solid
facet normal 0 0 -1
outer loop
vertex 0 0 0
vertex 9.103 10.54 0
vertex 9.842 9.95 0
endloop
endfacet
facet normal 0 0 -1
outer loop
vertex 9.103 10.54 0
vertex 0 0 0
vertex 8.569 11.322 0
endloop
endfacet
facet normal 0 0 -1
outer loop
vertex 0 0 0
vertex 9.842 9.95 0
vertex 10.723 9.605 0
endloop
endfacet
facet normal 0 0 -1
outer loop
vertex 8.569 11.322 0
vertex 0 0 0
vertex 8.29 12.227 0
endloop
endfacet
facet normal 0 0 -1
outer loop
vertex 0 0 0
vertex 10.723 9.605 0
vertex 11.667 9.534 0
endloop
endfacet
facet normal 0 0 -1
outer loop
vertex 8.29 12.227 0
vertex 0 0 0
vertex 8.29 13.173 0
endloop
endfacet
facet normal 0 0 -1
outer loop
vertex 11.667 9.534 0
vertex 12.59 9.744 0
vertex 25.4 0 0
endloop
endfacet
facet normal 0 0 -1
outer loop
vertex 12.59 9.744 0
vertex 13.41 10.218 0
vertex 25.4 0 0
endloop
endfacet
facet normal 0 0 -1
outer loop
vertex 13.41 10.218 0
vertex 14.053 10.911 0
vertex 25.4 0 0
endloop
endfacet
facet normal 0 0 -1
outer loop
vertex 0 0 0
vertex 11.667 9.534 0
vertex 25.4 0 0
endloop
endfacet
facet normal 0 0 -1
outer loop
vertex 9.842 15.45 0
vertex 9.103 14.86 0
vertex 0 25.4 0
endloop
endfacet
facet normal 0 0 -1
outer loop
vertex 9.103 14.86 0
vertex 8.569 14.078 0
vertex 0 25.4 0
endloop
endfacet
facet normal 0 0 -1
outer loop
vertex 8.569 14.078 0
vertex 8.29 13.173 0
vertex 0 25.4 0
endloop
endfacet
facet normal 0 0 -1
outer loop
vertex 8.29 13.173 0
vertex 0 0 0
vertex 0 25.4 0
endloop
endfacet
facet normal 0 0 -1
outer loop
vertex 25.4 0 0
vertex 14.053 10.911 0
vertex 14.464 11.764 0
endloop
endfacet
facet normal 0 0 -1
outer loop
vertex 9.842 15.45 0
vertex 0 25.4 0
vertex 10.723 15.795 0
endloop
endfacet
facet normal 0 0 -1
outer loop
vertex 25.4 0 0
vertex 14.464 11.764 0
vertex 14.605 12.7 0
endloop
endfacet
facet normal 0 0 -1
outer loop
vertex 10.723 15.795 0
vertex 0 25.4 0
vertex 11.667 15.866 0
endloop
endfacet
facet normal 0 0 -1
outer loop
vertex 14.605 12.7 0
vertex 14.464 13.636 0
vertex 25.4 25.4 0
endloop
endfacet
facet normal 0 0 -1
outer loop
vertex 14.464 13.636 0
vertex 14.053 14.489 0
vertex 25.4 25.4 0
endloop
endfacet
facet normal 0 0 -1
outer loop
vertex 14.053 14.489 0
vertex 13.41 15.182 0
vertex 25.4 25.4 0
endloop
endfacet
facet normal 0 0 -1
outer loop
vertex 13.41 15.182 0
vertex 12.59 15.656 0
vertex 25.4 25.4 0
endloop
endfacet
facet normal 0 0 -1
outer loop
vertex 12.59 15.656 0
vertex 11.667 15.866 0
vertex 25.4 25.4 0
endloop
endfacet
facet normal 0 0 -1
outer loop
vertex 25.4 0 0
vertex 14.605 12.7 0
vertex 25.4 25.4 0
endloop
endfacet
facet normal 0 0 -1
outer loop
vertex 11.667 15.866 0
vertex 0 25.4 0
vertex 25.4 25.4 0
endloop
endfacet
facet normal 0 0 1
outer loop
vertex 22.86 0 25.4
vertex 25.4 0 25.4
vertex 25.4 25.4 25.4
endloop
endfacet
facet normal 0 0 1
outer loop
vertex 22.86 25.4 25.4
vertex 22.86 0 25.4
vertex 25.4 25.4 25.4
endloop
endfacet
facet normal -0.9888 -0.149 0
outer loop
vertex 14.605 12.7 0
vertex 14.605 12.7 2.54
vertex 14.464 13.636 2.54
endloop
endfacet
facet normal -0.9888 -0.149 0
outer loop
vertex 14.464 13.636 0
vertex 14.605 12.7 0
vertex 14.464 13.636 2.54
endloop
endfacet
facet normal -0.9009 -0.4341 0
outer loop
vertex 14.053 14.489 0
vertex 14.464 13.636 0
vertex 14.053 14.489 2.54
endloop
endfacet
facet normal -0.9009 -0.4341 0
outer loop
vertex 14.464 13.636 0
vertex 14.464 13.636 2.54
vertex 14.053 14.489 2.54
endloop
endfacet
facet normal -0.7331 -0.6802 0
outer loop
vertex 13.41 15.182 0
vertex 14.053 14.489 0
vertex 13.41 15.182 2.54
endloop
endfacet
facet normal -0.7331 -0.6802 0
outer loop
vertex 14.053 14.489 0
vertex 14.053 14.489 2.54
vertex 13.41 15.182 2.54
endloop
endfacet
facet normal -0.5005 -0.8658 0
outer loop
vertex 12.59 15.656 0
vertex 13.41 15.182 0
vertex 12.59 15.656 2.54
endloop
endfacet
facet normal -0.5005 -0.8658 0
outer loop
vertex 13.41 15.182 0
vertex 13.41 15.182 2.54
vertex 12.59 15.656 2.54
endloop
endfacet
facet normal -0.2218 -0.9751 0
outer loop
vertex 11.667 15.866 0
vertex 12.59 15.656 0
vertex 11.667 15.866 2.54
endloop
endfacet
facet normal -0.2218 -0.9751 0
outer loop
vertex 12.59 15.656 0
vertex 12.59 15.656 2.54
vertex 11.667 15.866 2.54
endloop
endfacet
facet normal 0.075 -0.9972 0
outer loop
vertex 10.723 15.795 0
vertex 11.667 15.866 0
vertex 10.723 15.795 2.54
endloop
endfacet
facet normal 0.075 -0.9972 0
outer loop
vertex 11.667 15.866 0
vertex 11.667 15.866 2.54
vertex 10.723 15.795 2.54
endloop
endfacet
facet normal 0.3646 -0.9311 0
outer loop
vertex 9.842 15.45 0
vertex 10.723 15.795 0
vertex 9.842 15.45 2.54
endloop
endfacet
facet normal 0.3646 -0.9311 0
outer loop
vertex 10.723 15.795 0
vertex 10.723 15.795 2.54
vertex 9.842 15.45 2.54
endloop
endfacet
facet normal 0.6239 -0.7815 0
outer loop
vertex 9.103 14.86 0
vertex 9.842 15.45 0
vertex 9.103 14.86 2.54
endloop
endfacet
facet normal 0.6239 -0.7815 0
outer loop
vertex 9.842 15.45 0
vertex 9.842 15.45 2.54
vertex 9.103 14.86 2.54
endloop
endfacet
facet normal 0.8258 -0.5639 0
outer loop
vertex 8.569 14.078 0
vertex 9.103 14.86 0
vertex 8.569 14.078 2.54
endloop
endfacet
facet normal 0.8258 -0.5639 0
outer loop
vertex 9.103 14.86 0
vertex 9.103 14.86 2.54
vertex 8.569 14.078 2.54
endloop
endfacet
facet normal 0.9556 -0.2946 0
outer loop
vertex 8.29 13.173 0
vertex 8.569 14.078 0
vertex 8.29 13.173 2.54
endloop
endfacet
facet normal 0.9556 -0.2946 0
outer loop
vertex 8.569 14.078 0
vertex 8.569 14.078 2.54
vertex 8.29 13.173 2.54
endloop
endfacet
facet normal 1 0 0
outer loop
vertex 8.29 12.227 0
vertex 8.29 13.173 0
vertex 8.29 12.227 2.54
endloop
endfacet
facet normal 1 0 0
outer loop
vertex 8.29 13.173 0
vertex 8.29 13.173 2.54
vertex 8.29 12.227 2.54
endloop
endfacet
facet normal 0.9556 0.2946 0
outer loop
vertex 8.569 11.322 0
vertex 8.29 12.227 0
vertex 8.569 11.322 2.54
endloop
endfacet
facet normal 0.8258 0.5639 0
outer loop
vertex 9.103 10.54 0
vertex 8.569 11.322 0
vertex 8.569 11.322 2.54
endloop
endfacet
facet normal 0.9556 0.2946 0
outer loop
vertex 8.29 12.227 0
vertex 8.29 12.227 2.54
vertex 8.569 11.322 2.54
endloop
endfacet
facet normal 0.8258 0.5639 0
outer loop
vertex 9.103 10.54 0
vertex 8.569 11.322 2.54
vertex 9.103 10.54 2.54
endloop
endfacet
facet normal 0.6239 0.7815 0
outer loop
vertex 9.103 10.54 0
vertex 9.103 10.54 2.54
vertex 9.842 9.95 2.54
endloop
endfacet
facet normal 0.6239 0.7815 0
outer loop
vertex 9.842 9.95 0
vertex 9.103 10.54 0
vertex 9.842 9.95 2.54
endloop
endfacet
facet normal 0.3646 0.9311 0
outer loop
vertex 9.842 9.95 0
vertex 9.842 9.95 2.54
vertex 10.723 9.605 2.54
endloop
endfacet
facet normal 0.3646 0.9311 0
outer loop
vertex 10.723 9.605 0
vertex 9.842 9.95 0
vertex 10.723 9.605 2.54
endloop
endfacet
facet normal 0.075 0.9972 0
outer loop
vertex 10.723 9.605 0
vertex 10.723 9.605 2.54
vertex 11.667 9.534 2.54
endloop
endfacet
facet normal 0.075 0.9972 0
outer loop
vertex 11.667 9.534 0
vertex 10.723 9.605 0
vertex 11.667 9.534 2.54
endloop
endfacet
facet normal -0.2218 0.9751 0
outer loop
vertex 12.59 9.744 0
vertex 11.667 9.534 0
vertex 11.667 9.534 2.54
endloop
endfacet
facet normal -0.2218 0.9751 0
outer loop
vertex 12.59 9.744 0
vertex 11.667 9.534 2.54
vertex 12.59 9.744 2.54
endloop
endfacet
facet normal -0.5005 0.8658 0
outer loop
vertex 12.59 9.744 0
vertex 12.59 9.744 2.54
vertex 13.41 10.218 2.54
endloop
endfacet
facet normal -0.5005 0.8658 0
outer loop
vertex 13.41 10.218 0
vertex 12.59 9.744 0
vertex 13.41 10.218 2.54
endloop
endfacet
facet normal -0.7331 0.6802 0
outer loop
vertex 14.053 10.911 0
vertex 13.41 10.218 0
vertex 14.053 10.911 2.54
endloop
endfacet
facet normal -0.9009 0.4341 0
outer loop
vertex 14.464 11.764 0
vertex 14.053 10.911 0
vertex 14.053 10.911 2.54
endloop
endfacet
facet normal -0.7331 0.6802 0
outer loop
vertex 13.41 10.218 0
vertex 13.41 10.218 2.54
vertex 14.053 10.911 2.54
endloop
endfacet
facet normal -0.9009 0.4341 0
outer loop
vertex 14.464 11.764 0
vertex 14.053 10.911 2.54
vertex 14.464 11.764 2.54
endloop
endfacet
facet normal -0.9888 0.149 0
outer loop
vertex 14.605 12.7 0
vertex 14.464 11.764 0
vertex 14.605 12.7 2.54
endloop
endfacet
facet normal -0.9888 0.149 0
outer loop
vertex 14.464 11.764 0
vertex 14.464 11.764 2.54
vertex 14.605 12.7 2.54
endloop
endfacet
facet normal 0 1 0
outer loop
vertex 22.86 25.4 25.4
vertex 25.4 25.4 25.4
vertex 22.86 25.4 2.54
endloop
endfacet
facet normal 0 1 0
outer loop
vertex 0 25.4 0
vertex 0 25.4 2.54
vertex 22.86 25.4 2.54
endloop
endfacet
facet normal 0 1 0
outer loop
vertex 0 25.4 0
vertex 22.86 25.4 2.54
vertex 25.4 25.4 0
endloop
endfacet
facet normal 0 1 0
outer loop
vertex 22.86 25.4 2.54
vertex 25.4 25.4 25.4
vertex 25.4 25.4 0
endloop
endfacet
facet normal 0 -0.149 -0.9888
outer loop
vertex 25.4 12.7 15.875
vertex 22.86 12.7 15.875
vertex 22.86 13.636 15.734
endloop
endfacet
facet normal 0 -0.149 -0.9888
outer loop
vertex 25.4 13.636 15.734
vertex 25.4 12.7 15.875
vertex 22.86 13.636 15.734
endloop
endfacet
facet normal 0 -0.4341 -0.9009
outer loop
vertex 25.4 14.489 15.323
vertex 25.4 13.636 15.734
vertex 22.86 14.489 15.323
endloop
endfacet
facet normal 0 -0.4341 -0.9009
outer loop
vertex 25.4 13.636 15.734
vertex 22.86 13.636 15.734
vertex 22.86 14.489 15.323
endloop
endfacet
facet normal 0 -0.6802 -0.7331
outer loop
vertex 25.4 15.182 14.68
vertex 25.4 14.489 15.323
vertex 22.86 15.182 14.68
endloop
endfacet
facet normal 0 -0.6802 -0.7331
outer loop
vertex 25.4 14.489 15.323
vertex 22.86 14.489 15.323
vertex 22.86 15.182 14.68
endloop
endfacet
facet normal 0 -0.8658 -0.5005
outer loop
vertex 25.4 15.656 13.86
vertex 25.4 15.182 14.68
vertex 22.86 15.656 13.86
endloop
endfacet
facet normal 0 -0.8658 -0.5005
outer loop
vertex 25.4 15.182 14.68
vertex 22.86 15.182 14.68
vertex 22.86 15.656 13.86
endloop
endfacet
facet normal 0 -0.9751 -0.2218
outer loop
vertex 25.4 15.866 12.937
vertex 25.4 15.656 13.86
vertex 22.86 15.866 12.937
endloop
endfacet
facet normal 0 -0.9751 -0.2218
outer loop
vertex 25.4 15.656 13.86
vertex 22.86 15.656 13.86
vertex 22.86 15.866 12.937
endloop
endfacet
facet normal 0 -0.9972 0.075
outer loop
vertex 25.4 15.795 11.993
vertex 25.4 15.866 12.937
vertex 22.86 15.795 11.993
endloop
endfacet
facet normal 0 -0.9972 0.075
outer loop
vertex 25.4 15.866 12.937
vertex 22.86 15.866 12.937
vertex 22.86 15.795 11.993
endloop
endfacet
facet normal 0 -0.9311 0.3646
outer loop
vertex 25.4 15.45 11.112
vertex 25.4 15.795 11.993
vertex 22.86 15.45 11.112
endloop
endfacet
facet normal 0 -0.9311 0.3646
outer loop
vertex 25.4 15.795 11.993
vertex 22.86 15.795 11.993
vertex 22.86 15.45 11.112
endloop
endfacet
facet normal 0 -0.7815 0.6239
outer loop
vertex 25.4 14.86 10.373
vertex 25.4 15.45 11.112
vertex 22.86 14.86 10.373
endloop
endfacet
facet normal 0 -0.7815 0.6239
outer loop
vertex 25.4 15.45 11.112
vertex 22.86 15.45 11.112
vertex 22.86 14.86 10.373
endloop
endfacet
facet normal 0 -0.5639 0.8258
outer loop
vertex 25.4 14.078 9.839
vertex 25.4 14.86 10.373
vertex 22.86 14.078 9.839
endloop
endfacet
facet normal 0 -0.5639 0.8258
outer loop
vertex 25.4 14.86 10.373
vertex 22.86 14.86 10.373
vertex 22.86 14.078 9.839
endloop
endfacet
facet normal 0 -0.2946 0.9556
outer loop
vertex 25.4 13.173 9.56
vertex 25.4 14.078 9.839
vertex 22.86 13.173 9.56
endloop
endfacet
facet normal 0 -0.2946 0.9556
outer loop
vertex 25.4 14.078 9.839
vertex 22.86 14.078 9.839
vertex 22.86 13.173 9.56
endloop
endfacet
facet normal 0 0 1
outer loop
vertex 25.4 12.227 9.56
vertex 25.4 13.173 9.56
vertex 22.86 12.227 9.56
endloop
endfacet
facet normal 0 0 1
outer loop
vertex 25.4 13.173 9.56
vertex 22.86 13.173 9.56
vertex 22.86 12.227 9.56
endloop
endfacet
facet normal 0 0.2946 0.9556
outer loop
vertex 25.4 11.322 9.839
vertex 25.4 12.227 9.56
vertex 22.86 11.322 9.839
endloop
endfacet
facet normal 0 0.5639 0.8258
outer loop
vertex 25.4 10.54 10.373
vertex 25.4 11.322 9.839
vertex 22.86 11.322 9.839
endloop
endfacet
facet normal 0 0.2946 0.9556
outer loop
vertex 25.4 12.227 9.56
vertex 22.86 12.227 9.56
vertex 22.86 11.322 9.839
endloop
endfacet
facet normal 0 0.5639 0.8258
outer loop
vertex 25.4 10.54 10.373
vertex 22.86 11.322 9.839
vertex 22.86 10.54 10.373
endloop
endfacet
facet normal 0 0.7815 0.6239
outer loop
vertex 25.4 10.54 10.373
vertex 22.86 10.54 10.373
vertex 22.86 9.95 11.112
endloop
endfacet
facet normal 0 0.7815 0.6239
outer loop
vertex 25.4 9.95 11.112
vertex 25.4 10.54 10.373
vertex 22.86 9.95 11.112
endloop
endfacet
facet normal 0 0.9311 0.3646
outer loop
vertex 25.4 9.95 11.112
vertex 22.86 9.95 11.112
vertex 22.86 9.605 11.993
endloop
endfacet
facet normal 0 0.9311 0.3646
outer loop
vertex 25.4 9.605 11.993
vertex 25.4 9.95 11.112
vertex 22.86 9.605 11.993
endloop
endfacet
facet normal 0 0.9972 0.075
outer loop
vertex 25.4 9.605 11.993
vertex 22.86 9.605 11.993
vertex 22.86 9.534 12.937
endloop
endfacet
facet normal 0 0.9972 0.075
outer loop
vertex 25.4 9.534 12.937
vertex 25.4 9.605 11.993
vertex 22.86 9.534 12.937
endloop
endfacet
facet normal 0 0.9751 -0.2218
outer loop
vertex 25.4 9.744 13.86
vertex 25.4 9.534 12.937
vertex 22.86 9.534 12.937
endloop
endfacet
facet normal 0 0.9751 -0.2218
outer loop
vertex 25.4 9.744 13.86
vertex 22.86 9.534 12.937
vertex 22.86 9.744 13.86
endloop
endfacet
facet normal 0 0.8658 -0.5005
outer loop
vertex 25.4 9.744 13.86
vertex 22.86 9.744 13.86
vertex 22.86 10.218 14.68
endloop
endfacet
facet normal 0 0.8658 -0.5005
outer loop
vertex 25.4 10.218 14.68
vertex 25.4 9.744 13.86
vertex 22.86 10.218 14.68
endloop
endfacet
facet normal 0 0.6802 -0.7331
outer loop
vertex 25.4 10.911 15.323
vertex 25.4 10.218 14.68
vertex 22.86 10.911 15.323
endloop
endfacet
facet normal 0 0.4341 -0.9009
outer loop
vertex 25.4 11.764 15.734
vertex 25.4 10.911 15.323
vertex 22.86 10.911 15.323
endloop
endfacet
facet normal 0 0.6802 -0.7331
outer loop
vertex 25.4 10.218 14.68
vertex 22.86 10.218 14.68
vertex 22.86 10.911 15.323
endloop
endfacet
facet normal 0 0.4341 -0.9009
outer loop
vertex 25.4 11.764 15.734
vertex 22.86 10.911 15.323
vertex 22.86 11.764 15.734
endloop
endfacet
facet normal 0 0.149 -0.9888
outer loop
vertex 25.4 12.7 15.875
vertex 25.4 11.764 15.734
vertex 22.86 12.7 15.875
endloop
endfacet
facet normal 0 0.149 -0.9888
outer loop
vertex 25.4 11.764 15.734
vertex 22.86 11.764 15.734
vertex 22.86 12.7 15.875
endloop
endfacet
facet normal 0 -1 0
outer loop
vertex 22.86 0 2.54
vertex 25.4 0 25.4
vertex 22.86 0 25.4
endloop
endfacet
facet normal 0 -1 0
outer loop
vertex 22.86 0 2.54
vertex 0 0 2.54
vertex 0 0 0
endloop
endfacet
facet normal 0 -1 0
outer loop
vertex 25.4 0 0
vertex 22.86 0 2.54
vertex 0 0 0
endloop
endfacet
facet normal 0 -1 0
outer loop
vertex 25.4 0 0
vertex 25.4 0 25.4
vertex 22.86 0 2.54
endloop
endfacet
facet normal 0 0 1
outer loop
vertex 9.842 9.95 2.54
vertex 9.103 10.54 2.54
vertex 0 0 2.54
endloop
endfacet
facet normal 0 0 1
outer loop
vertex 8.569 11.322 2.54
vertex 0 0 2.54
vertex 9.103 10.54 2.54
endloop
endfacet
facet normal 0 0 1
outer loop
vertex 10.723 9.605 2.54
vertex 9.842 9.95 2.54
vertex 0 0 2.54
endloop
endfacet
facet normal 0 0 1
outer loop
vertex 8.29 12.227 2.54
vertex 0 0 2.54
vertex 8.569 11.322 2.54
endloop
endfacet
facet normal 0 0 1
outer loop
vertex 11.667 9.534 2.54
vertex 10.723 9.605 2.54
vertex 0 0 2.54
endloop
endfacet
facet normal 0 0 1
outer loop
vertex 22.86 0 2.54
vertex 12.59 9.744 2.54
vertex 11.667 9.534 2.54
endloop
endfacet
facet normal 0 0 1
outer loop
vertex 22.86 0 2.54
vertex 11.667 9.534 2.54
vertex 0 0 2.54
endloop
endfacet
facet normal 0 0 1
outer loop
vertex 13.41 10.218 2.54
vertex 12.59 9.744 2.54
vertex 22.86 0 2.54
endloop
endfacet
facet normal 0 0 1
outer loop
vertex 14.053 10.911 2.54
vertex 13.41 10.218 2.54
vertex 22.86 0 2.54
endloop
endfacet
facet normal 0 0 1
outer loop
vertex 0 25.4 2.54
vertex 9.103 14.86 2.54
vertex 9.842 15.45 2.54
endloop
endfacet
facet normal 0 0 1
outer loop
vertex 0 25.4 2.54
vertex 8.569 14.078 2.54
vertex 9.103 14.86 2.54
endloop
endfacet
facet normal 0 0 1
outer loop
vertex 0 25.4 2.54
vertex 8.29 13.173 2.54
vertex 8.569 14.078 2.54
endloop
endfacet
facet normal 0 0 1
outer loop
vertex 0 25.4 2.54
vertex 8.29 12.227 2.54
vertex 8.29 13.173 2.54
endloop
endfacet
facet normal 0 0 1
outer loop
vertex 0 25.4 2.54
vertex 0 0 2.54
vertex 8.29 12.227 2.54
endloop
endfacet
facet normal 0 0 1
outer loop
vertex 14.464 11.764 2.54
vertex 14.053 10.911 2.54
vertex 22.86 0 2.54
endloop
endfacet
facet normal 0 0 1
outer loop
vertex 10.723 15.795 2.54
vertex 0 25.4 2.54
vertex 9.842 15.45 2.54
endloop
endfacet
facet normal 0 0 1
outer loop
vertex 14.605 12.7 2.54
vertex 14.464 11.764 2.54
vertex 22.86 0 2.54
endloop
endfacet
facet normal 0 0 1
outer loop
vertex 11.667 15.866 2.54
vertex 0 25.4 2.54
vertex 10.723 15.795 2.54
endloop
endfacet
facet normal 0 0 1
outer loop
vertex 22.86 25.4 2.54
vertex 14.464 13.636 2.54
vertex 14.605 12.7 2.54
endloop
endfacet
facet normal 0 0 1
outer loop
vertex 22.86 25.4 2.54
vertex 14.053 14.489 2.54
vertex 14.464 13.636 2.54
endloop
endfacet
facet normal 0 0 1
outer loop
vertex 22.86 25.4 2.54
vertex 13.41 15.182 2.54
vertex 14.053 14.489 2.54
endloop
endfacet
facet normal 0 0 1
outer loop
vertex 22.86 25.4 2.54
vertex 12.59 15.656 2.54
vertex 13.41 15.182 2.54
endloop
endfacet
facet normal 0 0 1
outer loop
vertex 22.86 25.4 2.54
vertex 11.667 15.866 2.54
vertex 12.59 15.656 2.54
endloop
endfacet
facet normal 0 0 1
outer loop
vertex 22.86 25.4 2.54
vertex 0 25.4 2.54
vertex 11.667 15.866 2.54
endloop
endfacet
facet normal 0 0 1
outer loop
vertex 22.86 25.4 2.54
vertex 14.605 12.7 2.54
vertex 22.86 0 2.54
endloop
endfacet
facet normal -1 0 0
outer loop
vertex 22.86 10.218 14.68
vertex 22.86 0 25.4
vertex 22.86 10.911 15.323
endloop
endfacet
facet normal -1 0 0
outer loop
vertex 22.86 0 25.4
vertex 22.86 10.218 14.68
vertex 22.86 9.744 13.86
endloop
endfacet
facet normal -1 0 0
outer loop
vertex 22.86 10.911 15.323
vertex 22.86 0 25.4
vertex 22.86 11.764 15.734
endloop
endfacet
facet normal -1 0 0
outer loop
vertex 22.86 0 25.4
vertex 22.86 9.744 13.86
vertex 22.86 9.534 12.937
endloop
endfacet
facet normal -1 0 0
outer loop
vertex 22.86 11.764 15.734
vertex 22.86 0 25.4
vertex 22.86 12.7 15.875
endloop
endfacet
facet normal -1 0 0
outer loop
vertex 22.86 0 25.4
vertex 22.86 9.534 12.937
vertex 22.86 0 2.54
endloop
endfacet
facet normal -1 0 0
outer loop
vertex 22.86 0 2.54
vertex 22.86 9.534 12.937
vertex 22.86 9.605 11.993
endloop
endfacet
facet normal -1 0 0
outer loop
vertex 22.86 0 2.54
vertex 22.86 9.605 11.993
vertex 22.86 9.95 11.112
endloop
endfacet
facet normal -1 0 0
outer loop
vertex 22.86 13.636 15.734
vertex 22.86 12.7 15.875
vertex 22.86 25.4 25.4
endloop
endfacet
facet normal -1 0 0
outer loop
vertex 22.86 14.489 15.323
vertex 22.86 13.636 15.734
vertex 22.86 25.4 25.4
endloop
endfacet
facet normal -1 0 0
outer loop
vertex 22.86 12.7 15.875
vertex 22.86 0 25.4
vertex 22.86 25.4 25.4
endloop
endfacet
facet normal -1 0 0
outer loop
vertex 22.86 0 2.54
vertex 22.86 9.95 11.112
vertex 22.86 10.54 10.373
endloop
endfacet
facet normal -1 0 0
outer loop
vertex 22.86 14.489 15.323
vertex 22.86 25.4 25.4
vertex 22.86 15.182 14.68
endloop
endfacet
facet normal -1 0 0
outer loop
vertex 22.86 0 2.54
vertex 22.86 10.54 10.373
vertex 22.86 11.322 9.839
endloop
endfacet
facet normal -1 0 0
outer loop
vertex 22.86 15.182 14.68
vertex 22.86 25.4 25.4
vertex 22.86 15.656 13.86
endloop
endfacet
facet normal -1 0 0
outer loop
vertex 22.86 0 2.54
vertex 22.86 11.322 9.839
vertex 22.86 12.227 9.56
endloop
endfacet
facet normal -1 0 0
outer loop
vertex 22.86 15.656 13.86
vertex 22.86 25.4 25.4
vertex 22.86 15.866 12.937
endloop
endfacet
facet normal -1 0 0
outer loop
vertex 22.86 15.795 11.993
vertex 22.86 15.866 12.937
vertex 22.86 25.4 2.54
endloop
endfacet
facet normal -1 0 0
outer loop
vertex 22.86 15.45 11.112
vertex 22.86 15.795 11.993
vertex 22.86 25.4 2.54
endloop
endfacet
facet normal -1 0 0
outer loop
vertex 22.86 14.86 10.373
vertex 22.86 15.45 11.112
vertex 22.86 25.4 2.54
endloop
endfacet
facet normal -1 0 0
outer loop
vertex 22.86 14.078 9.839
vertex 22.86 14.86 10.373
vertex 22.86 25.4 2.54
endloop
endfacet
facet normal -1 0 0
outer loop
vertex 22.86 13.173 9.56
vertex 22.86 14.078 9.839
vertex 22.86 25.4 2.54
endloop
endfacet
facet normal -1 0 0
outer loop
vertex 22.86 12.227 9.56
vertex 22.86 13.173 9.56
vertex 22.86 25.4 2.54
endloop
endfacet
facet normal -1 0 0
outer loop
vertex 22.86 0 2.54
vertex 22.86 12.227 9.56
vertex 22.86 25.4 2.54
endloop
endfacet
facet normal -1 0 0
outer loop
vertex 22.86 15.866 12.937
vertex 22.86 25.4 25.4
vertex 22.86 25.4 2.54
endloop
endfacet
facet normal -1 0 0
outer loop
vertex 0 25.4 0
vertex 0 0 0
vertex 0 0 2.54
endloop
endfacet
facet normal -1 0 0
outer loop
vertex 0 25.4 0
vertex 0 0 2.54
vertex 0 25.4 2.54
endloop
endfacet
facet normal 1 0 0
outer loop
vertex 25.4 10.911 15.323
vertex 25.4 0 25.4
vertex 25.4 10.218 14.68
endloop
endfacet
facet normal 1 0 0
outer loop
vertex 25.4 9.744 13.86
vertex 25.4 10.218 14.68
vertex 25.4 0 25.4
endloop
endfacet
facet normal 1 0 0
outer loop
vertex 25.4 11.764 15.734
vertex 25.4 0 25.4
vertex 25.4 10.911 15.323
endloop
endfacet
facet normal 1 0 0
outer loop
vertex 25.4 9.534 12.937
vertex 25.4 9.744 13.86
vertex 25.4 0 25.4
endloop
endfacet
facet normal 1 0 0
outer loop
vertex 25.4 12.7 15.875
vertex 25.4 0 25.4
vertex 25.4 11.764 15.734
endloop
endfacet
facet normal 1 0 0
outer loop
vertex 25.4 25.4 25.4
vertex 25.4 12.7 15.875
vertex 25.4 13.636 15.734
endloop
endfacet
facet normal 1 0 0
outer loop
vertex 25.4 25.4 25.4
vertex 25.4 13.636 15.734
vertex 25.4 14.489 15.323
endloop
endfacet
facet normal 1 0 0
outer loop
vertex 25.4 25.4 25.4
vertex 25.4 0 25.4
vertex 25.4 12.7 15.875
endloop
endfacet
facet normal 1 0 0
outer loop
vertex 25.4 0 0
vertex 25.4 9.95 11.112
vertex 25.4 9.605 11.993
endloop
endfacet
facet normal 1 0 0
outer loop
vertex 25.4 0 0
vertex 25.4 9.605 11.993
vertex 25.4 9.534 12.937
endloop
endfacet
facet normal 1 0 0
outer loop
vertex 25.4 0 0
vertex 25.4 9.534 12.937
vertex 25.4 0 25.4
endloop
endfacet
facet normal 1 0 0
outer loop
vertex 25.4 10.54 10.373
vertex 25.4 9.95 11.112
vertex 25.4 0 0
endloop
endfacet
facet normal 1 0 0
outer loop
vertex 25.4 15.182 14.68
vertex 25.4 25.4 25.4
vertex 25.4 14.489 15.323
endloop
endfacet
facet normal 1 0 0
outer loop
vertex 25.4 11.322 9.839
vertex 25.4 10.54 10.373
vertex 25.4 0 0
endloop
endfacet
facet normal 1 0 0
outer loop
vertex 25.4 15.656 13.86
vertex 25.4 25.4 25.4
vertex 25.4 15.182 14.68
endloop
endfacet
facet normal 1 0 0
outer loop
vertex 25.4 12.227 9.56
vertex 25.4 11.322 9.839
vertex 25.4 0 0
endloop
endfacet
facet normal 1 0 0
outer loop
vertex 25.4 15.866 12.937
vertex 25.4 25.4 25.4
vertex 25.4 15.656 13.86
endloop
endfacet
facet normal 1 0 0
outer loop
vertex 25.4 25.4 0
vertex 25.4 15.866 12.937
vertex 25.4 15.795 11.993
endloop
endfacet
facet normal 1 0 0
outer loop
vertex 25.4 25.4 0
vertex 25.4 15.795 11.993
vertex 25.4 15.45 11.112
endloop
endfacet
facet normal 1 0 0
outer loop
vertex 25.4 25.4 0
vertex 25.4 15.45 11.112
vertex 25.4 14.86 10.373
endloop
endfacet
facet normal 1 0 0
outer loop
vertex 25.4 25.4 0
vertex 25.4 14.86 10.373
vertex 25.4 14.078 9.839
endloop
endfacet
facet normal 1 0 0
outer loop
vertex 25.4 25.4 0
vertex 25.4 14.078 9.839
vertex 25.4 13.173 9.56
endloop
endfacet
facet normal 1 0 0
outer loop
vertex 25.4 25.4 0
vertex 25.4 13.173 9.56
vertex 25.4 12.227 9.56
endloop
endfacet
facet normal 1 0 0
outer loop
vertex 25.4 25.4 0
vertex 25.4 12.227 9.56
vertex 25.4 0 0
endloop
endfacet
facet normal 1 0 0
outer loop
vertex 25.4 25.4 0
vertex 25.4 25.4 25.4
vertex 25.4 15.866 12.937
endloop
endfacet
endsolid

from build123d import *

# Parameters (mm, degrees)
SKETCH1_W           = 25.4
SKETCH1_H           = 25.4
BOSS_EXTRUDE1_DEPTH = 2.54
SKETCH2_W           = 25.4
SKETCH2_H           = 25.4
BOSS_EXTRUDE2_DEPTH = 2.54
SKETCH3_R           = 3.175
CUT_EXTRUDE1_DEPTH  = 2.54
SKETCH4_R           = 3.175
CUT_EXTRUDE2_DEPTH  = 2.54


with BuildPart() as part:
    # Sketch1 → Boss-Extrude1 (new body)
    with BuildSketch(Plane.XY):
        with Locations((12.7, 12.7)):
            Rectangle(SKETCH1_W, SKETCH1_H)
    extrude(amount=BOSS_EXTRUDE1_DEPTH)

    # Sketch2 → Boss-Extrude2 (add)
    with BuildSketch(Plane(origin=(25.4, 0, 0), x_dir=(0, 0, -1), z_dir=(1, 0, 0))):
        with Locations((-12.7, 12.7)):
            Rectangle(SKETCH2_W, SKETCH2_H)
    extrude(amount=-BOSS_EXTRUDE2_DEPTH)

    # Sketch3 → Cut-Extrude1 (cut)
    with BuildSketch(Plane.XY.offset(2.54)):
        with Locations((11.43, 12.7)):
            Circle(SKETCH3_R)
    extrude(amount=-CUT_EXTRUDE1_DEPTH, mode=Mode.SUBTRACT)

    # Sketch4 → Cut-Extrude2 (cut)
    with BuildSketch(Plane.ZY.offset(-22.86)):
        with Locations((12.7, 12.7)):
            Circle(SKETCH4_R)
    extrude(amount=-CUT_EXTRUDE2_DEPTH, mode=Mode.SUBTRACT)


solid = part.part
